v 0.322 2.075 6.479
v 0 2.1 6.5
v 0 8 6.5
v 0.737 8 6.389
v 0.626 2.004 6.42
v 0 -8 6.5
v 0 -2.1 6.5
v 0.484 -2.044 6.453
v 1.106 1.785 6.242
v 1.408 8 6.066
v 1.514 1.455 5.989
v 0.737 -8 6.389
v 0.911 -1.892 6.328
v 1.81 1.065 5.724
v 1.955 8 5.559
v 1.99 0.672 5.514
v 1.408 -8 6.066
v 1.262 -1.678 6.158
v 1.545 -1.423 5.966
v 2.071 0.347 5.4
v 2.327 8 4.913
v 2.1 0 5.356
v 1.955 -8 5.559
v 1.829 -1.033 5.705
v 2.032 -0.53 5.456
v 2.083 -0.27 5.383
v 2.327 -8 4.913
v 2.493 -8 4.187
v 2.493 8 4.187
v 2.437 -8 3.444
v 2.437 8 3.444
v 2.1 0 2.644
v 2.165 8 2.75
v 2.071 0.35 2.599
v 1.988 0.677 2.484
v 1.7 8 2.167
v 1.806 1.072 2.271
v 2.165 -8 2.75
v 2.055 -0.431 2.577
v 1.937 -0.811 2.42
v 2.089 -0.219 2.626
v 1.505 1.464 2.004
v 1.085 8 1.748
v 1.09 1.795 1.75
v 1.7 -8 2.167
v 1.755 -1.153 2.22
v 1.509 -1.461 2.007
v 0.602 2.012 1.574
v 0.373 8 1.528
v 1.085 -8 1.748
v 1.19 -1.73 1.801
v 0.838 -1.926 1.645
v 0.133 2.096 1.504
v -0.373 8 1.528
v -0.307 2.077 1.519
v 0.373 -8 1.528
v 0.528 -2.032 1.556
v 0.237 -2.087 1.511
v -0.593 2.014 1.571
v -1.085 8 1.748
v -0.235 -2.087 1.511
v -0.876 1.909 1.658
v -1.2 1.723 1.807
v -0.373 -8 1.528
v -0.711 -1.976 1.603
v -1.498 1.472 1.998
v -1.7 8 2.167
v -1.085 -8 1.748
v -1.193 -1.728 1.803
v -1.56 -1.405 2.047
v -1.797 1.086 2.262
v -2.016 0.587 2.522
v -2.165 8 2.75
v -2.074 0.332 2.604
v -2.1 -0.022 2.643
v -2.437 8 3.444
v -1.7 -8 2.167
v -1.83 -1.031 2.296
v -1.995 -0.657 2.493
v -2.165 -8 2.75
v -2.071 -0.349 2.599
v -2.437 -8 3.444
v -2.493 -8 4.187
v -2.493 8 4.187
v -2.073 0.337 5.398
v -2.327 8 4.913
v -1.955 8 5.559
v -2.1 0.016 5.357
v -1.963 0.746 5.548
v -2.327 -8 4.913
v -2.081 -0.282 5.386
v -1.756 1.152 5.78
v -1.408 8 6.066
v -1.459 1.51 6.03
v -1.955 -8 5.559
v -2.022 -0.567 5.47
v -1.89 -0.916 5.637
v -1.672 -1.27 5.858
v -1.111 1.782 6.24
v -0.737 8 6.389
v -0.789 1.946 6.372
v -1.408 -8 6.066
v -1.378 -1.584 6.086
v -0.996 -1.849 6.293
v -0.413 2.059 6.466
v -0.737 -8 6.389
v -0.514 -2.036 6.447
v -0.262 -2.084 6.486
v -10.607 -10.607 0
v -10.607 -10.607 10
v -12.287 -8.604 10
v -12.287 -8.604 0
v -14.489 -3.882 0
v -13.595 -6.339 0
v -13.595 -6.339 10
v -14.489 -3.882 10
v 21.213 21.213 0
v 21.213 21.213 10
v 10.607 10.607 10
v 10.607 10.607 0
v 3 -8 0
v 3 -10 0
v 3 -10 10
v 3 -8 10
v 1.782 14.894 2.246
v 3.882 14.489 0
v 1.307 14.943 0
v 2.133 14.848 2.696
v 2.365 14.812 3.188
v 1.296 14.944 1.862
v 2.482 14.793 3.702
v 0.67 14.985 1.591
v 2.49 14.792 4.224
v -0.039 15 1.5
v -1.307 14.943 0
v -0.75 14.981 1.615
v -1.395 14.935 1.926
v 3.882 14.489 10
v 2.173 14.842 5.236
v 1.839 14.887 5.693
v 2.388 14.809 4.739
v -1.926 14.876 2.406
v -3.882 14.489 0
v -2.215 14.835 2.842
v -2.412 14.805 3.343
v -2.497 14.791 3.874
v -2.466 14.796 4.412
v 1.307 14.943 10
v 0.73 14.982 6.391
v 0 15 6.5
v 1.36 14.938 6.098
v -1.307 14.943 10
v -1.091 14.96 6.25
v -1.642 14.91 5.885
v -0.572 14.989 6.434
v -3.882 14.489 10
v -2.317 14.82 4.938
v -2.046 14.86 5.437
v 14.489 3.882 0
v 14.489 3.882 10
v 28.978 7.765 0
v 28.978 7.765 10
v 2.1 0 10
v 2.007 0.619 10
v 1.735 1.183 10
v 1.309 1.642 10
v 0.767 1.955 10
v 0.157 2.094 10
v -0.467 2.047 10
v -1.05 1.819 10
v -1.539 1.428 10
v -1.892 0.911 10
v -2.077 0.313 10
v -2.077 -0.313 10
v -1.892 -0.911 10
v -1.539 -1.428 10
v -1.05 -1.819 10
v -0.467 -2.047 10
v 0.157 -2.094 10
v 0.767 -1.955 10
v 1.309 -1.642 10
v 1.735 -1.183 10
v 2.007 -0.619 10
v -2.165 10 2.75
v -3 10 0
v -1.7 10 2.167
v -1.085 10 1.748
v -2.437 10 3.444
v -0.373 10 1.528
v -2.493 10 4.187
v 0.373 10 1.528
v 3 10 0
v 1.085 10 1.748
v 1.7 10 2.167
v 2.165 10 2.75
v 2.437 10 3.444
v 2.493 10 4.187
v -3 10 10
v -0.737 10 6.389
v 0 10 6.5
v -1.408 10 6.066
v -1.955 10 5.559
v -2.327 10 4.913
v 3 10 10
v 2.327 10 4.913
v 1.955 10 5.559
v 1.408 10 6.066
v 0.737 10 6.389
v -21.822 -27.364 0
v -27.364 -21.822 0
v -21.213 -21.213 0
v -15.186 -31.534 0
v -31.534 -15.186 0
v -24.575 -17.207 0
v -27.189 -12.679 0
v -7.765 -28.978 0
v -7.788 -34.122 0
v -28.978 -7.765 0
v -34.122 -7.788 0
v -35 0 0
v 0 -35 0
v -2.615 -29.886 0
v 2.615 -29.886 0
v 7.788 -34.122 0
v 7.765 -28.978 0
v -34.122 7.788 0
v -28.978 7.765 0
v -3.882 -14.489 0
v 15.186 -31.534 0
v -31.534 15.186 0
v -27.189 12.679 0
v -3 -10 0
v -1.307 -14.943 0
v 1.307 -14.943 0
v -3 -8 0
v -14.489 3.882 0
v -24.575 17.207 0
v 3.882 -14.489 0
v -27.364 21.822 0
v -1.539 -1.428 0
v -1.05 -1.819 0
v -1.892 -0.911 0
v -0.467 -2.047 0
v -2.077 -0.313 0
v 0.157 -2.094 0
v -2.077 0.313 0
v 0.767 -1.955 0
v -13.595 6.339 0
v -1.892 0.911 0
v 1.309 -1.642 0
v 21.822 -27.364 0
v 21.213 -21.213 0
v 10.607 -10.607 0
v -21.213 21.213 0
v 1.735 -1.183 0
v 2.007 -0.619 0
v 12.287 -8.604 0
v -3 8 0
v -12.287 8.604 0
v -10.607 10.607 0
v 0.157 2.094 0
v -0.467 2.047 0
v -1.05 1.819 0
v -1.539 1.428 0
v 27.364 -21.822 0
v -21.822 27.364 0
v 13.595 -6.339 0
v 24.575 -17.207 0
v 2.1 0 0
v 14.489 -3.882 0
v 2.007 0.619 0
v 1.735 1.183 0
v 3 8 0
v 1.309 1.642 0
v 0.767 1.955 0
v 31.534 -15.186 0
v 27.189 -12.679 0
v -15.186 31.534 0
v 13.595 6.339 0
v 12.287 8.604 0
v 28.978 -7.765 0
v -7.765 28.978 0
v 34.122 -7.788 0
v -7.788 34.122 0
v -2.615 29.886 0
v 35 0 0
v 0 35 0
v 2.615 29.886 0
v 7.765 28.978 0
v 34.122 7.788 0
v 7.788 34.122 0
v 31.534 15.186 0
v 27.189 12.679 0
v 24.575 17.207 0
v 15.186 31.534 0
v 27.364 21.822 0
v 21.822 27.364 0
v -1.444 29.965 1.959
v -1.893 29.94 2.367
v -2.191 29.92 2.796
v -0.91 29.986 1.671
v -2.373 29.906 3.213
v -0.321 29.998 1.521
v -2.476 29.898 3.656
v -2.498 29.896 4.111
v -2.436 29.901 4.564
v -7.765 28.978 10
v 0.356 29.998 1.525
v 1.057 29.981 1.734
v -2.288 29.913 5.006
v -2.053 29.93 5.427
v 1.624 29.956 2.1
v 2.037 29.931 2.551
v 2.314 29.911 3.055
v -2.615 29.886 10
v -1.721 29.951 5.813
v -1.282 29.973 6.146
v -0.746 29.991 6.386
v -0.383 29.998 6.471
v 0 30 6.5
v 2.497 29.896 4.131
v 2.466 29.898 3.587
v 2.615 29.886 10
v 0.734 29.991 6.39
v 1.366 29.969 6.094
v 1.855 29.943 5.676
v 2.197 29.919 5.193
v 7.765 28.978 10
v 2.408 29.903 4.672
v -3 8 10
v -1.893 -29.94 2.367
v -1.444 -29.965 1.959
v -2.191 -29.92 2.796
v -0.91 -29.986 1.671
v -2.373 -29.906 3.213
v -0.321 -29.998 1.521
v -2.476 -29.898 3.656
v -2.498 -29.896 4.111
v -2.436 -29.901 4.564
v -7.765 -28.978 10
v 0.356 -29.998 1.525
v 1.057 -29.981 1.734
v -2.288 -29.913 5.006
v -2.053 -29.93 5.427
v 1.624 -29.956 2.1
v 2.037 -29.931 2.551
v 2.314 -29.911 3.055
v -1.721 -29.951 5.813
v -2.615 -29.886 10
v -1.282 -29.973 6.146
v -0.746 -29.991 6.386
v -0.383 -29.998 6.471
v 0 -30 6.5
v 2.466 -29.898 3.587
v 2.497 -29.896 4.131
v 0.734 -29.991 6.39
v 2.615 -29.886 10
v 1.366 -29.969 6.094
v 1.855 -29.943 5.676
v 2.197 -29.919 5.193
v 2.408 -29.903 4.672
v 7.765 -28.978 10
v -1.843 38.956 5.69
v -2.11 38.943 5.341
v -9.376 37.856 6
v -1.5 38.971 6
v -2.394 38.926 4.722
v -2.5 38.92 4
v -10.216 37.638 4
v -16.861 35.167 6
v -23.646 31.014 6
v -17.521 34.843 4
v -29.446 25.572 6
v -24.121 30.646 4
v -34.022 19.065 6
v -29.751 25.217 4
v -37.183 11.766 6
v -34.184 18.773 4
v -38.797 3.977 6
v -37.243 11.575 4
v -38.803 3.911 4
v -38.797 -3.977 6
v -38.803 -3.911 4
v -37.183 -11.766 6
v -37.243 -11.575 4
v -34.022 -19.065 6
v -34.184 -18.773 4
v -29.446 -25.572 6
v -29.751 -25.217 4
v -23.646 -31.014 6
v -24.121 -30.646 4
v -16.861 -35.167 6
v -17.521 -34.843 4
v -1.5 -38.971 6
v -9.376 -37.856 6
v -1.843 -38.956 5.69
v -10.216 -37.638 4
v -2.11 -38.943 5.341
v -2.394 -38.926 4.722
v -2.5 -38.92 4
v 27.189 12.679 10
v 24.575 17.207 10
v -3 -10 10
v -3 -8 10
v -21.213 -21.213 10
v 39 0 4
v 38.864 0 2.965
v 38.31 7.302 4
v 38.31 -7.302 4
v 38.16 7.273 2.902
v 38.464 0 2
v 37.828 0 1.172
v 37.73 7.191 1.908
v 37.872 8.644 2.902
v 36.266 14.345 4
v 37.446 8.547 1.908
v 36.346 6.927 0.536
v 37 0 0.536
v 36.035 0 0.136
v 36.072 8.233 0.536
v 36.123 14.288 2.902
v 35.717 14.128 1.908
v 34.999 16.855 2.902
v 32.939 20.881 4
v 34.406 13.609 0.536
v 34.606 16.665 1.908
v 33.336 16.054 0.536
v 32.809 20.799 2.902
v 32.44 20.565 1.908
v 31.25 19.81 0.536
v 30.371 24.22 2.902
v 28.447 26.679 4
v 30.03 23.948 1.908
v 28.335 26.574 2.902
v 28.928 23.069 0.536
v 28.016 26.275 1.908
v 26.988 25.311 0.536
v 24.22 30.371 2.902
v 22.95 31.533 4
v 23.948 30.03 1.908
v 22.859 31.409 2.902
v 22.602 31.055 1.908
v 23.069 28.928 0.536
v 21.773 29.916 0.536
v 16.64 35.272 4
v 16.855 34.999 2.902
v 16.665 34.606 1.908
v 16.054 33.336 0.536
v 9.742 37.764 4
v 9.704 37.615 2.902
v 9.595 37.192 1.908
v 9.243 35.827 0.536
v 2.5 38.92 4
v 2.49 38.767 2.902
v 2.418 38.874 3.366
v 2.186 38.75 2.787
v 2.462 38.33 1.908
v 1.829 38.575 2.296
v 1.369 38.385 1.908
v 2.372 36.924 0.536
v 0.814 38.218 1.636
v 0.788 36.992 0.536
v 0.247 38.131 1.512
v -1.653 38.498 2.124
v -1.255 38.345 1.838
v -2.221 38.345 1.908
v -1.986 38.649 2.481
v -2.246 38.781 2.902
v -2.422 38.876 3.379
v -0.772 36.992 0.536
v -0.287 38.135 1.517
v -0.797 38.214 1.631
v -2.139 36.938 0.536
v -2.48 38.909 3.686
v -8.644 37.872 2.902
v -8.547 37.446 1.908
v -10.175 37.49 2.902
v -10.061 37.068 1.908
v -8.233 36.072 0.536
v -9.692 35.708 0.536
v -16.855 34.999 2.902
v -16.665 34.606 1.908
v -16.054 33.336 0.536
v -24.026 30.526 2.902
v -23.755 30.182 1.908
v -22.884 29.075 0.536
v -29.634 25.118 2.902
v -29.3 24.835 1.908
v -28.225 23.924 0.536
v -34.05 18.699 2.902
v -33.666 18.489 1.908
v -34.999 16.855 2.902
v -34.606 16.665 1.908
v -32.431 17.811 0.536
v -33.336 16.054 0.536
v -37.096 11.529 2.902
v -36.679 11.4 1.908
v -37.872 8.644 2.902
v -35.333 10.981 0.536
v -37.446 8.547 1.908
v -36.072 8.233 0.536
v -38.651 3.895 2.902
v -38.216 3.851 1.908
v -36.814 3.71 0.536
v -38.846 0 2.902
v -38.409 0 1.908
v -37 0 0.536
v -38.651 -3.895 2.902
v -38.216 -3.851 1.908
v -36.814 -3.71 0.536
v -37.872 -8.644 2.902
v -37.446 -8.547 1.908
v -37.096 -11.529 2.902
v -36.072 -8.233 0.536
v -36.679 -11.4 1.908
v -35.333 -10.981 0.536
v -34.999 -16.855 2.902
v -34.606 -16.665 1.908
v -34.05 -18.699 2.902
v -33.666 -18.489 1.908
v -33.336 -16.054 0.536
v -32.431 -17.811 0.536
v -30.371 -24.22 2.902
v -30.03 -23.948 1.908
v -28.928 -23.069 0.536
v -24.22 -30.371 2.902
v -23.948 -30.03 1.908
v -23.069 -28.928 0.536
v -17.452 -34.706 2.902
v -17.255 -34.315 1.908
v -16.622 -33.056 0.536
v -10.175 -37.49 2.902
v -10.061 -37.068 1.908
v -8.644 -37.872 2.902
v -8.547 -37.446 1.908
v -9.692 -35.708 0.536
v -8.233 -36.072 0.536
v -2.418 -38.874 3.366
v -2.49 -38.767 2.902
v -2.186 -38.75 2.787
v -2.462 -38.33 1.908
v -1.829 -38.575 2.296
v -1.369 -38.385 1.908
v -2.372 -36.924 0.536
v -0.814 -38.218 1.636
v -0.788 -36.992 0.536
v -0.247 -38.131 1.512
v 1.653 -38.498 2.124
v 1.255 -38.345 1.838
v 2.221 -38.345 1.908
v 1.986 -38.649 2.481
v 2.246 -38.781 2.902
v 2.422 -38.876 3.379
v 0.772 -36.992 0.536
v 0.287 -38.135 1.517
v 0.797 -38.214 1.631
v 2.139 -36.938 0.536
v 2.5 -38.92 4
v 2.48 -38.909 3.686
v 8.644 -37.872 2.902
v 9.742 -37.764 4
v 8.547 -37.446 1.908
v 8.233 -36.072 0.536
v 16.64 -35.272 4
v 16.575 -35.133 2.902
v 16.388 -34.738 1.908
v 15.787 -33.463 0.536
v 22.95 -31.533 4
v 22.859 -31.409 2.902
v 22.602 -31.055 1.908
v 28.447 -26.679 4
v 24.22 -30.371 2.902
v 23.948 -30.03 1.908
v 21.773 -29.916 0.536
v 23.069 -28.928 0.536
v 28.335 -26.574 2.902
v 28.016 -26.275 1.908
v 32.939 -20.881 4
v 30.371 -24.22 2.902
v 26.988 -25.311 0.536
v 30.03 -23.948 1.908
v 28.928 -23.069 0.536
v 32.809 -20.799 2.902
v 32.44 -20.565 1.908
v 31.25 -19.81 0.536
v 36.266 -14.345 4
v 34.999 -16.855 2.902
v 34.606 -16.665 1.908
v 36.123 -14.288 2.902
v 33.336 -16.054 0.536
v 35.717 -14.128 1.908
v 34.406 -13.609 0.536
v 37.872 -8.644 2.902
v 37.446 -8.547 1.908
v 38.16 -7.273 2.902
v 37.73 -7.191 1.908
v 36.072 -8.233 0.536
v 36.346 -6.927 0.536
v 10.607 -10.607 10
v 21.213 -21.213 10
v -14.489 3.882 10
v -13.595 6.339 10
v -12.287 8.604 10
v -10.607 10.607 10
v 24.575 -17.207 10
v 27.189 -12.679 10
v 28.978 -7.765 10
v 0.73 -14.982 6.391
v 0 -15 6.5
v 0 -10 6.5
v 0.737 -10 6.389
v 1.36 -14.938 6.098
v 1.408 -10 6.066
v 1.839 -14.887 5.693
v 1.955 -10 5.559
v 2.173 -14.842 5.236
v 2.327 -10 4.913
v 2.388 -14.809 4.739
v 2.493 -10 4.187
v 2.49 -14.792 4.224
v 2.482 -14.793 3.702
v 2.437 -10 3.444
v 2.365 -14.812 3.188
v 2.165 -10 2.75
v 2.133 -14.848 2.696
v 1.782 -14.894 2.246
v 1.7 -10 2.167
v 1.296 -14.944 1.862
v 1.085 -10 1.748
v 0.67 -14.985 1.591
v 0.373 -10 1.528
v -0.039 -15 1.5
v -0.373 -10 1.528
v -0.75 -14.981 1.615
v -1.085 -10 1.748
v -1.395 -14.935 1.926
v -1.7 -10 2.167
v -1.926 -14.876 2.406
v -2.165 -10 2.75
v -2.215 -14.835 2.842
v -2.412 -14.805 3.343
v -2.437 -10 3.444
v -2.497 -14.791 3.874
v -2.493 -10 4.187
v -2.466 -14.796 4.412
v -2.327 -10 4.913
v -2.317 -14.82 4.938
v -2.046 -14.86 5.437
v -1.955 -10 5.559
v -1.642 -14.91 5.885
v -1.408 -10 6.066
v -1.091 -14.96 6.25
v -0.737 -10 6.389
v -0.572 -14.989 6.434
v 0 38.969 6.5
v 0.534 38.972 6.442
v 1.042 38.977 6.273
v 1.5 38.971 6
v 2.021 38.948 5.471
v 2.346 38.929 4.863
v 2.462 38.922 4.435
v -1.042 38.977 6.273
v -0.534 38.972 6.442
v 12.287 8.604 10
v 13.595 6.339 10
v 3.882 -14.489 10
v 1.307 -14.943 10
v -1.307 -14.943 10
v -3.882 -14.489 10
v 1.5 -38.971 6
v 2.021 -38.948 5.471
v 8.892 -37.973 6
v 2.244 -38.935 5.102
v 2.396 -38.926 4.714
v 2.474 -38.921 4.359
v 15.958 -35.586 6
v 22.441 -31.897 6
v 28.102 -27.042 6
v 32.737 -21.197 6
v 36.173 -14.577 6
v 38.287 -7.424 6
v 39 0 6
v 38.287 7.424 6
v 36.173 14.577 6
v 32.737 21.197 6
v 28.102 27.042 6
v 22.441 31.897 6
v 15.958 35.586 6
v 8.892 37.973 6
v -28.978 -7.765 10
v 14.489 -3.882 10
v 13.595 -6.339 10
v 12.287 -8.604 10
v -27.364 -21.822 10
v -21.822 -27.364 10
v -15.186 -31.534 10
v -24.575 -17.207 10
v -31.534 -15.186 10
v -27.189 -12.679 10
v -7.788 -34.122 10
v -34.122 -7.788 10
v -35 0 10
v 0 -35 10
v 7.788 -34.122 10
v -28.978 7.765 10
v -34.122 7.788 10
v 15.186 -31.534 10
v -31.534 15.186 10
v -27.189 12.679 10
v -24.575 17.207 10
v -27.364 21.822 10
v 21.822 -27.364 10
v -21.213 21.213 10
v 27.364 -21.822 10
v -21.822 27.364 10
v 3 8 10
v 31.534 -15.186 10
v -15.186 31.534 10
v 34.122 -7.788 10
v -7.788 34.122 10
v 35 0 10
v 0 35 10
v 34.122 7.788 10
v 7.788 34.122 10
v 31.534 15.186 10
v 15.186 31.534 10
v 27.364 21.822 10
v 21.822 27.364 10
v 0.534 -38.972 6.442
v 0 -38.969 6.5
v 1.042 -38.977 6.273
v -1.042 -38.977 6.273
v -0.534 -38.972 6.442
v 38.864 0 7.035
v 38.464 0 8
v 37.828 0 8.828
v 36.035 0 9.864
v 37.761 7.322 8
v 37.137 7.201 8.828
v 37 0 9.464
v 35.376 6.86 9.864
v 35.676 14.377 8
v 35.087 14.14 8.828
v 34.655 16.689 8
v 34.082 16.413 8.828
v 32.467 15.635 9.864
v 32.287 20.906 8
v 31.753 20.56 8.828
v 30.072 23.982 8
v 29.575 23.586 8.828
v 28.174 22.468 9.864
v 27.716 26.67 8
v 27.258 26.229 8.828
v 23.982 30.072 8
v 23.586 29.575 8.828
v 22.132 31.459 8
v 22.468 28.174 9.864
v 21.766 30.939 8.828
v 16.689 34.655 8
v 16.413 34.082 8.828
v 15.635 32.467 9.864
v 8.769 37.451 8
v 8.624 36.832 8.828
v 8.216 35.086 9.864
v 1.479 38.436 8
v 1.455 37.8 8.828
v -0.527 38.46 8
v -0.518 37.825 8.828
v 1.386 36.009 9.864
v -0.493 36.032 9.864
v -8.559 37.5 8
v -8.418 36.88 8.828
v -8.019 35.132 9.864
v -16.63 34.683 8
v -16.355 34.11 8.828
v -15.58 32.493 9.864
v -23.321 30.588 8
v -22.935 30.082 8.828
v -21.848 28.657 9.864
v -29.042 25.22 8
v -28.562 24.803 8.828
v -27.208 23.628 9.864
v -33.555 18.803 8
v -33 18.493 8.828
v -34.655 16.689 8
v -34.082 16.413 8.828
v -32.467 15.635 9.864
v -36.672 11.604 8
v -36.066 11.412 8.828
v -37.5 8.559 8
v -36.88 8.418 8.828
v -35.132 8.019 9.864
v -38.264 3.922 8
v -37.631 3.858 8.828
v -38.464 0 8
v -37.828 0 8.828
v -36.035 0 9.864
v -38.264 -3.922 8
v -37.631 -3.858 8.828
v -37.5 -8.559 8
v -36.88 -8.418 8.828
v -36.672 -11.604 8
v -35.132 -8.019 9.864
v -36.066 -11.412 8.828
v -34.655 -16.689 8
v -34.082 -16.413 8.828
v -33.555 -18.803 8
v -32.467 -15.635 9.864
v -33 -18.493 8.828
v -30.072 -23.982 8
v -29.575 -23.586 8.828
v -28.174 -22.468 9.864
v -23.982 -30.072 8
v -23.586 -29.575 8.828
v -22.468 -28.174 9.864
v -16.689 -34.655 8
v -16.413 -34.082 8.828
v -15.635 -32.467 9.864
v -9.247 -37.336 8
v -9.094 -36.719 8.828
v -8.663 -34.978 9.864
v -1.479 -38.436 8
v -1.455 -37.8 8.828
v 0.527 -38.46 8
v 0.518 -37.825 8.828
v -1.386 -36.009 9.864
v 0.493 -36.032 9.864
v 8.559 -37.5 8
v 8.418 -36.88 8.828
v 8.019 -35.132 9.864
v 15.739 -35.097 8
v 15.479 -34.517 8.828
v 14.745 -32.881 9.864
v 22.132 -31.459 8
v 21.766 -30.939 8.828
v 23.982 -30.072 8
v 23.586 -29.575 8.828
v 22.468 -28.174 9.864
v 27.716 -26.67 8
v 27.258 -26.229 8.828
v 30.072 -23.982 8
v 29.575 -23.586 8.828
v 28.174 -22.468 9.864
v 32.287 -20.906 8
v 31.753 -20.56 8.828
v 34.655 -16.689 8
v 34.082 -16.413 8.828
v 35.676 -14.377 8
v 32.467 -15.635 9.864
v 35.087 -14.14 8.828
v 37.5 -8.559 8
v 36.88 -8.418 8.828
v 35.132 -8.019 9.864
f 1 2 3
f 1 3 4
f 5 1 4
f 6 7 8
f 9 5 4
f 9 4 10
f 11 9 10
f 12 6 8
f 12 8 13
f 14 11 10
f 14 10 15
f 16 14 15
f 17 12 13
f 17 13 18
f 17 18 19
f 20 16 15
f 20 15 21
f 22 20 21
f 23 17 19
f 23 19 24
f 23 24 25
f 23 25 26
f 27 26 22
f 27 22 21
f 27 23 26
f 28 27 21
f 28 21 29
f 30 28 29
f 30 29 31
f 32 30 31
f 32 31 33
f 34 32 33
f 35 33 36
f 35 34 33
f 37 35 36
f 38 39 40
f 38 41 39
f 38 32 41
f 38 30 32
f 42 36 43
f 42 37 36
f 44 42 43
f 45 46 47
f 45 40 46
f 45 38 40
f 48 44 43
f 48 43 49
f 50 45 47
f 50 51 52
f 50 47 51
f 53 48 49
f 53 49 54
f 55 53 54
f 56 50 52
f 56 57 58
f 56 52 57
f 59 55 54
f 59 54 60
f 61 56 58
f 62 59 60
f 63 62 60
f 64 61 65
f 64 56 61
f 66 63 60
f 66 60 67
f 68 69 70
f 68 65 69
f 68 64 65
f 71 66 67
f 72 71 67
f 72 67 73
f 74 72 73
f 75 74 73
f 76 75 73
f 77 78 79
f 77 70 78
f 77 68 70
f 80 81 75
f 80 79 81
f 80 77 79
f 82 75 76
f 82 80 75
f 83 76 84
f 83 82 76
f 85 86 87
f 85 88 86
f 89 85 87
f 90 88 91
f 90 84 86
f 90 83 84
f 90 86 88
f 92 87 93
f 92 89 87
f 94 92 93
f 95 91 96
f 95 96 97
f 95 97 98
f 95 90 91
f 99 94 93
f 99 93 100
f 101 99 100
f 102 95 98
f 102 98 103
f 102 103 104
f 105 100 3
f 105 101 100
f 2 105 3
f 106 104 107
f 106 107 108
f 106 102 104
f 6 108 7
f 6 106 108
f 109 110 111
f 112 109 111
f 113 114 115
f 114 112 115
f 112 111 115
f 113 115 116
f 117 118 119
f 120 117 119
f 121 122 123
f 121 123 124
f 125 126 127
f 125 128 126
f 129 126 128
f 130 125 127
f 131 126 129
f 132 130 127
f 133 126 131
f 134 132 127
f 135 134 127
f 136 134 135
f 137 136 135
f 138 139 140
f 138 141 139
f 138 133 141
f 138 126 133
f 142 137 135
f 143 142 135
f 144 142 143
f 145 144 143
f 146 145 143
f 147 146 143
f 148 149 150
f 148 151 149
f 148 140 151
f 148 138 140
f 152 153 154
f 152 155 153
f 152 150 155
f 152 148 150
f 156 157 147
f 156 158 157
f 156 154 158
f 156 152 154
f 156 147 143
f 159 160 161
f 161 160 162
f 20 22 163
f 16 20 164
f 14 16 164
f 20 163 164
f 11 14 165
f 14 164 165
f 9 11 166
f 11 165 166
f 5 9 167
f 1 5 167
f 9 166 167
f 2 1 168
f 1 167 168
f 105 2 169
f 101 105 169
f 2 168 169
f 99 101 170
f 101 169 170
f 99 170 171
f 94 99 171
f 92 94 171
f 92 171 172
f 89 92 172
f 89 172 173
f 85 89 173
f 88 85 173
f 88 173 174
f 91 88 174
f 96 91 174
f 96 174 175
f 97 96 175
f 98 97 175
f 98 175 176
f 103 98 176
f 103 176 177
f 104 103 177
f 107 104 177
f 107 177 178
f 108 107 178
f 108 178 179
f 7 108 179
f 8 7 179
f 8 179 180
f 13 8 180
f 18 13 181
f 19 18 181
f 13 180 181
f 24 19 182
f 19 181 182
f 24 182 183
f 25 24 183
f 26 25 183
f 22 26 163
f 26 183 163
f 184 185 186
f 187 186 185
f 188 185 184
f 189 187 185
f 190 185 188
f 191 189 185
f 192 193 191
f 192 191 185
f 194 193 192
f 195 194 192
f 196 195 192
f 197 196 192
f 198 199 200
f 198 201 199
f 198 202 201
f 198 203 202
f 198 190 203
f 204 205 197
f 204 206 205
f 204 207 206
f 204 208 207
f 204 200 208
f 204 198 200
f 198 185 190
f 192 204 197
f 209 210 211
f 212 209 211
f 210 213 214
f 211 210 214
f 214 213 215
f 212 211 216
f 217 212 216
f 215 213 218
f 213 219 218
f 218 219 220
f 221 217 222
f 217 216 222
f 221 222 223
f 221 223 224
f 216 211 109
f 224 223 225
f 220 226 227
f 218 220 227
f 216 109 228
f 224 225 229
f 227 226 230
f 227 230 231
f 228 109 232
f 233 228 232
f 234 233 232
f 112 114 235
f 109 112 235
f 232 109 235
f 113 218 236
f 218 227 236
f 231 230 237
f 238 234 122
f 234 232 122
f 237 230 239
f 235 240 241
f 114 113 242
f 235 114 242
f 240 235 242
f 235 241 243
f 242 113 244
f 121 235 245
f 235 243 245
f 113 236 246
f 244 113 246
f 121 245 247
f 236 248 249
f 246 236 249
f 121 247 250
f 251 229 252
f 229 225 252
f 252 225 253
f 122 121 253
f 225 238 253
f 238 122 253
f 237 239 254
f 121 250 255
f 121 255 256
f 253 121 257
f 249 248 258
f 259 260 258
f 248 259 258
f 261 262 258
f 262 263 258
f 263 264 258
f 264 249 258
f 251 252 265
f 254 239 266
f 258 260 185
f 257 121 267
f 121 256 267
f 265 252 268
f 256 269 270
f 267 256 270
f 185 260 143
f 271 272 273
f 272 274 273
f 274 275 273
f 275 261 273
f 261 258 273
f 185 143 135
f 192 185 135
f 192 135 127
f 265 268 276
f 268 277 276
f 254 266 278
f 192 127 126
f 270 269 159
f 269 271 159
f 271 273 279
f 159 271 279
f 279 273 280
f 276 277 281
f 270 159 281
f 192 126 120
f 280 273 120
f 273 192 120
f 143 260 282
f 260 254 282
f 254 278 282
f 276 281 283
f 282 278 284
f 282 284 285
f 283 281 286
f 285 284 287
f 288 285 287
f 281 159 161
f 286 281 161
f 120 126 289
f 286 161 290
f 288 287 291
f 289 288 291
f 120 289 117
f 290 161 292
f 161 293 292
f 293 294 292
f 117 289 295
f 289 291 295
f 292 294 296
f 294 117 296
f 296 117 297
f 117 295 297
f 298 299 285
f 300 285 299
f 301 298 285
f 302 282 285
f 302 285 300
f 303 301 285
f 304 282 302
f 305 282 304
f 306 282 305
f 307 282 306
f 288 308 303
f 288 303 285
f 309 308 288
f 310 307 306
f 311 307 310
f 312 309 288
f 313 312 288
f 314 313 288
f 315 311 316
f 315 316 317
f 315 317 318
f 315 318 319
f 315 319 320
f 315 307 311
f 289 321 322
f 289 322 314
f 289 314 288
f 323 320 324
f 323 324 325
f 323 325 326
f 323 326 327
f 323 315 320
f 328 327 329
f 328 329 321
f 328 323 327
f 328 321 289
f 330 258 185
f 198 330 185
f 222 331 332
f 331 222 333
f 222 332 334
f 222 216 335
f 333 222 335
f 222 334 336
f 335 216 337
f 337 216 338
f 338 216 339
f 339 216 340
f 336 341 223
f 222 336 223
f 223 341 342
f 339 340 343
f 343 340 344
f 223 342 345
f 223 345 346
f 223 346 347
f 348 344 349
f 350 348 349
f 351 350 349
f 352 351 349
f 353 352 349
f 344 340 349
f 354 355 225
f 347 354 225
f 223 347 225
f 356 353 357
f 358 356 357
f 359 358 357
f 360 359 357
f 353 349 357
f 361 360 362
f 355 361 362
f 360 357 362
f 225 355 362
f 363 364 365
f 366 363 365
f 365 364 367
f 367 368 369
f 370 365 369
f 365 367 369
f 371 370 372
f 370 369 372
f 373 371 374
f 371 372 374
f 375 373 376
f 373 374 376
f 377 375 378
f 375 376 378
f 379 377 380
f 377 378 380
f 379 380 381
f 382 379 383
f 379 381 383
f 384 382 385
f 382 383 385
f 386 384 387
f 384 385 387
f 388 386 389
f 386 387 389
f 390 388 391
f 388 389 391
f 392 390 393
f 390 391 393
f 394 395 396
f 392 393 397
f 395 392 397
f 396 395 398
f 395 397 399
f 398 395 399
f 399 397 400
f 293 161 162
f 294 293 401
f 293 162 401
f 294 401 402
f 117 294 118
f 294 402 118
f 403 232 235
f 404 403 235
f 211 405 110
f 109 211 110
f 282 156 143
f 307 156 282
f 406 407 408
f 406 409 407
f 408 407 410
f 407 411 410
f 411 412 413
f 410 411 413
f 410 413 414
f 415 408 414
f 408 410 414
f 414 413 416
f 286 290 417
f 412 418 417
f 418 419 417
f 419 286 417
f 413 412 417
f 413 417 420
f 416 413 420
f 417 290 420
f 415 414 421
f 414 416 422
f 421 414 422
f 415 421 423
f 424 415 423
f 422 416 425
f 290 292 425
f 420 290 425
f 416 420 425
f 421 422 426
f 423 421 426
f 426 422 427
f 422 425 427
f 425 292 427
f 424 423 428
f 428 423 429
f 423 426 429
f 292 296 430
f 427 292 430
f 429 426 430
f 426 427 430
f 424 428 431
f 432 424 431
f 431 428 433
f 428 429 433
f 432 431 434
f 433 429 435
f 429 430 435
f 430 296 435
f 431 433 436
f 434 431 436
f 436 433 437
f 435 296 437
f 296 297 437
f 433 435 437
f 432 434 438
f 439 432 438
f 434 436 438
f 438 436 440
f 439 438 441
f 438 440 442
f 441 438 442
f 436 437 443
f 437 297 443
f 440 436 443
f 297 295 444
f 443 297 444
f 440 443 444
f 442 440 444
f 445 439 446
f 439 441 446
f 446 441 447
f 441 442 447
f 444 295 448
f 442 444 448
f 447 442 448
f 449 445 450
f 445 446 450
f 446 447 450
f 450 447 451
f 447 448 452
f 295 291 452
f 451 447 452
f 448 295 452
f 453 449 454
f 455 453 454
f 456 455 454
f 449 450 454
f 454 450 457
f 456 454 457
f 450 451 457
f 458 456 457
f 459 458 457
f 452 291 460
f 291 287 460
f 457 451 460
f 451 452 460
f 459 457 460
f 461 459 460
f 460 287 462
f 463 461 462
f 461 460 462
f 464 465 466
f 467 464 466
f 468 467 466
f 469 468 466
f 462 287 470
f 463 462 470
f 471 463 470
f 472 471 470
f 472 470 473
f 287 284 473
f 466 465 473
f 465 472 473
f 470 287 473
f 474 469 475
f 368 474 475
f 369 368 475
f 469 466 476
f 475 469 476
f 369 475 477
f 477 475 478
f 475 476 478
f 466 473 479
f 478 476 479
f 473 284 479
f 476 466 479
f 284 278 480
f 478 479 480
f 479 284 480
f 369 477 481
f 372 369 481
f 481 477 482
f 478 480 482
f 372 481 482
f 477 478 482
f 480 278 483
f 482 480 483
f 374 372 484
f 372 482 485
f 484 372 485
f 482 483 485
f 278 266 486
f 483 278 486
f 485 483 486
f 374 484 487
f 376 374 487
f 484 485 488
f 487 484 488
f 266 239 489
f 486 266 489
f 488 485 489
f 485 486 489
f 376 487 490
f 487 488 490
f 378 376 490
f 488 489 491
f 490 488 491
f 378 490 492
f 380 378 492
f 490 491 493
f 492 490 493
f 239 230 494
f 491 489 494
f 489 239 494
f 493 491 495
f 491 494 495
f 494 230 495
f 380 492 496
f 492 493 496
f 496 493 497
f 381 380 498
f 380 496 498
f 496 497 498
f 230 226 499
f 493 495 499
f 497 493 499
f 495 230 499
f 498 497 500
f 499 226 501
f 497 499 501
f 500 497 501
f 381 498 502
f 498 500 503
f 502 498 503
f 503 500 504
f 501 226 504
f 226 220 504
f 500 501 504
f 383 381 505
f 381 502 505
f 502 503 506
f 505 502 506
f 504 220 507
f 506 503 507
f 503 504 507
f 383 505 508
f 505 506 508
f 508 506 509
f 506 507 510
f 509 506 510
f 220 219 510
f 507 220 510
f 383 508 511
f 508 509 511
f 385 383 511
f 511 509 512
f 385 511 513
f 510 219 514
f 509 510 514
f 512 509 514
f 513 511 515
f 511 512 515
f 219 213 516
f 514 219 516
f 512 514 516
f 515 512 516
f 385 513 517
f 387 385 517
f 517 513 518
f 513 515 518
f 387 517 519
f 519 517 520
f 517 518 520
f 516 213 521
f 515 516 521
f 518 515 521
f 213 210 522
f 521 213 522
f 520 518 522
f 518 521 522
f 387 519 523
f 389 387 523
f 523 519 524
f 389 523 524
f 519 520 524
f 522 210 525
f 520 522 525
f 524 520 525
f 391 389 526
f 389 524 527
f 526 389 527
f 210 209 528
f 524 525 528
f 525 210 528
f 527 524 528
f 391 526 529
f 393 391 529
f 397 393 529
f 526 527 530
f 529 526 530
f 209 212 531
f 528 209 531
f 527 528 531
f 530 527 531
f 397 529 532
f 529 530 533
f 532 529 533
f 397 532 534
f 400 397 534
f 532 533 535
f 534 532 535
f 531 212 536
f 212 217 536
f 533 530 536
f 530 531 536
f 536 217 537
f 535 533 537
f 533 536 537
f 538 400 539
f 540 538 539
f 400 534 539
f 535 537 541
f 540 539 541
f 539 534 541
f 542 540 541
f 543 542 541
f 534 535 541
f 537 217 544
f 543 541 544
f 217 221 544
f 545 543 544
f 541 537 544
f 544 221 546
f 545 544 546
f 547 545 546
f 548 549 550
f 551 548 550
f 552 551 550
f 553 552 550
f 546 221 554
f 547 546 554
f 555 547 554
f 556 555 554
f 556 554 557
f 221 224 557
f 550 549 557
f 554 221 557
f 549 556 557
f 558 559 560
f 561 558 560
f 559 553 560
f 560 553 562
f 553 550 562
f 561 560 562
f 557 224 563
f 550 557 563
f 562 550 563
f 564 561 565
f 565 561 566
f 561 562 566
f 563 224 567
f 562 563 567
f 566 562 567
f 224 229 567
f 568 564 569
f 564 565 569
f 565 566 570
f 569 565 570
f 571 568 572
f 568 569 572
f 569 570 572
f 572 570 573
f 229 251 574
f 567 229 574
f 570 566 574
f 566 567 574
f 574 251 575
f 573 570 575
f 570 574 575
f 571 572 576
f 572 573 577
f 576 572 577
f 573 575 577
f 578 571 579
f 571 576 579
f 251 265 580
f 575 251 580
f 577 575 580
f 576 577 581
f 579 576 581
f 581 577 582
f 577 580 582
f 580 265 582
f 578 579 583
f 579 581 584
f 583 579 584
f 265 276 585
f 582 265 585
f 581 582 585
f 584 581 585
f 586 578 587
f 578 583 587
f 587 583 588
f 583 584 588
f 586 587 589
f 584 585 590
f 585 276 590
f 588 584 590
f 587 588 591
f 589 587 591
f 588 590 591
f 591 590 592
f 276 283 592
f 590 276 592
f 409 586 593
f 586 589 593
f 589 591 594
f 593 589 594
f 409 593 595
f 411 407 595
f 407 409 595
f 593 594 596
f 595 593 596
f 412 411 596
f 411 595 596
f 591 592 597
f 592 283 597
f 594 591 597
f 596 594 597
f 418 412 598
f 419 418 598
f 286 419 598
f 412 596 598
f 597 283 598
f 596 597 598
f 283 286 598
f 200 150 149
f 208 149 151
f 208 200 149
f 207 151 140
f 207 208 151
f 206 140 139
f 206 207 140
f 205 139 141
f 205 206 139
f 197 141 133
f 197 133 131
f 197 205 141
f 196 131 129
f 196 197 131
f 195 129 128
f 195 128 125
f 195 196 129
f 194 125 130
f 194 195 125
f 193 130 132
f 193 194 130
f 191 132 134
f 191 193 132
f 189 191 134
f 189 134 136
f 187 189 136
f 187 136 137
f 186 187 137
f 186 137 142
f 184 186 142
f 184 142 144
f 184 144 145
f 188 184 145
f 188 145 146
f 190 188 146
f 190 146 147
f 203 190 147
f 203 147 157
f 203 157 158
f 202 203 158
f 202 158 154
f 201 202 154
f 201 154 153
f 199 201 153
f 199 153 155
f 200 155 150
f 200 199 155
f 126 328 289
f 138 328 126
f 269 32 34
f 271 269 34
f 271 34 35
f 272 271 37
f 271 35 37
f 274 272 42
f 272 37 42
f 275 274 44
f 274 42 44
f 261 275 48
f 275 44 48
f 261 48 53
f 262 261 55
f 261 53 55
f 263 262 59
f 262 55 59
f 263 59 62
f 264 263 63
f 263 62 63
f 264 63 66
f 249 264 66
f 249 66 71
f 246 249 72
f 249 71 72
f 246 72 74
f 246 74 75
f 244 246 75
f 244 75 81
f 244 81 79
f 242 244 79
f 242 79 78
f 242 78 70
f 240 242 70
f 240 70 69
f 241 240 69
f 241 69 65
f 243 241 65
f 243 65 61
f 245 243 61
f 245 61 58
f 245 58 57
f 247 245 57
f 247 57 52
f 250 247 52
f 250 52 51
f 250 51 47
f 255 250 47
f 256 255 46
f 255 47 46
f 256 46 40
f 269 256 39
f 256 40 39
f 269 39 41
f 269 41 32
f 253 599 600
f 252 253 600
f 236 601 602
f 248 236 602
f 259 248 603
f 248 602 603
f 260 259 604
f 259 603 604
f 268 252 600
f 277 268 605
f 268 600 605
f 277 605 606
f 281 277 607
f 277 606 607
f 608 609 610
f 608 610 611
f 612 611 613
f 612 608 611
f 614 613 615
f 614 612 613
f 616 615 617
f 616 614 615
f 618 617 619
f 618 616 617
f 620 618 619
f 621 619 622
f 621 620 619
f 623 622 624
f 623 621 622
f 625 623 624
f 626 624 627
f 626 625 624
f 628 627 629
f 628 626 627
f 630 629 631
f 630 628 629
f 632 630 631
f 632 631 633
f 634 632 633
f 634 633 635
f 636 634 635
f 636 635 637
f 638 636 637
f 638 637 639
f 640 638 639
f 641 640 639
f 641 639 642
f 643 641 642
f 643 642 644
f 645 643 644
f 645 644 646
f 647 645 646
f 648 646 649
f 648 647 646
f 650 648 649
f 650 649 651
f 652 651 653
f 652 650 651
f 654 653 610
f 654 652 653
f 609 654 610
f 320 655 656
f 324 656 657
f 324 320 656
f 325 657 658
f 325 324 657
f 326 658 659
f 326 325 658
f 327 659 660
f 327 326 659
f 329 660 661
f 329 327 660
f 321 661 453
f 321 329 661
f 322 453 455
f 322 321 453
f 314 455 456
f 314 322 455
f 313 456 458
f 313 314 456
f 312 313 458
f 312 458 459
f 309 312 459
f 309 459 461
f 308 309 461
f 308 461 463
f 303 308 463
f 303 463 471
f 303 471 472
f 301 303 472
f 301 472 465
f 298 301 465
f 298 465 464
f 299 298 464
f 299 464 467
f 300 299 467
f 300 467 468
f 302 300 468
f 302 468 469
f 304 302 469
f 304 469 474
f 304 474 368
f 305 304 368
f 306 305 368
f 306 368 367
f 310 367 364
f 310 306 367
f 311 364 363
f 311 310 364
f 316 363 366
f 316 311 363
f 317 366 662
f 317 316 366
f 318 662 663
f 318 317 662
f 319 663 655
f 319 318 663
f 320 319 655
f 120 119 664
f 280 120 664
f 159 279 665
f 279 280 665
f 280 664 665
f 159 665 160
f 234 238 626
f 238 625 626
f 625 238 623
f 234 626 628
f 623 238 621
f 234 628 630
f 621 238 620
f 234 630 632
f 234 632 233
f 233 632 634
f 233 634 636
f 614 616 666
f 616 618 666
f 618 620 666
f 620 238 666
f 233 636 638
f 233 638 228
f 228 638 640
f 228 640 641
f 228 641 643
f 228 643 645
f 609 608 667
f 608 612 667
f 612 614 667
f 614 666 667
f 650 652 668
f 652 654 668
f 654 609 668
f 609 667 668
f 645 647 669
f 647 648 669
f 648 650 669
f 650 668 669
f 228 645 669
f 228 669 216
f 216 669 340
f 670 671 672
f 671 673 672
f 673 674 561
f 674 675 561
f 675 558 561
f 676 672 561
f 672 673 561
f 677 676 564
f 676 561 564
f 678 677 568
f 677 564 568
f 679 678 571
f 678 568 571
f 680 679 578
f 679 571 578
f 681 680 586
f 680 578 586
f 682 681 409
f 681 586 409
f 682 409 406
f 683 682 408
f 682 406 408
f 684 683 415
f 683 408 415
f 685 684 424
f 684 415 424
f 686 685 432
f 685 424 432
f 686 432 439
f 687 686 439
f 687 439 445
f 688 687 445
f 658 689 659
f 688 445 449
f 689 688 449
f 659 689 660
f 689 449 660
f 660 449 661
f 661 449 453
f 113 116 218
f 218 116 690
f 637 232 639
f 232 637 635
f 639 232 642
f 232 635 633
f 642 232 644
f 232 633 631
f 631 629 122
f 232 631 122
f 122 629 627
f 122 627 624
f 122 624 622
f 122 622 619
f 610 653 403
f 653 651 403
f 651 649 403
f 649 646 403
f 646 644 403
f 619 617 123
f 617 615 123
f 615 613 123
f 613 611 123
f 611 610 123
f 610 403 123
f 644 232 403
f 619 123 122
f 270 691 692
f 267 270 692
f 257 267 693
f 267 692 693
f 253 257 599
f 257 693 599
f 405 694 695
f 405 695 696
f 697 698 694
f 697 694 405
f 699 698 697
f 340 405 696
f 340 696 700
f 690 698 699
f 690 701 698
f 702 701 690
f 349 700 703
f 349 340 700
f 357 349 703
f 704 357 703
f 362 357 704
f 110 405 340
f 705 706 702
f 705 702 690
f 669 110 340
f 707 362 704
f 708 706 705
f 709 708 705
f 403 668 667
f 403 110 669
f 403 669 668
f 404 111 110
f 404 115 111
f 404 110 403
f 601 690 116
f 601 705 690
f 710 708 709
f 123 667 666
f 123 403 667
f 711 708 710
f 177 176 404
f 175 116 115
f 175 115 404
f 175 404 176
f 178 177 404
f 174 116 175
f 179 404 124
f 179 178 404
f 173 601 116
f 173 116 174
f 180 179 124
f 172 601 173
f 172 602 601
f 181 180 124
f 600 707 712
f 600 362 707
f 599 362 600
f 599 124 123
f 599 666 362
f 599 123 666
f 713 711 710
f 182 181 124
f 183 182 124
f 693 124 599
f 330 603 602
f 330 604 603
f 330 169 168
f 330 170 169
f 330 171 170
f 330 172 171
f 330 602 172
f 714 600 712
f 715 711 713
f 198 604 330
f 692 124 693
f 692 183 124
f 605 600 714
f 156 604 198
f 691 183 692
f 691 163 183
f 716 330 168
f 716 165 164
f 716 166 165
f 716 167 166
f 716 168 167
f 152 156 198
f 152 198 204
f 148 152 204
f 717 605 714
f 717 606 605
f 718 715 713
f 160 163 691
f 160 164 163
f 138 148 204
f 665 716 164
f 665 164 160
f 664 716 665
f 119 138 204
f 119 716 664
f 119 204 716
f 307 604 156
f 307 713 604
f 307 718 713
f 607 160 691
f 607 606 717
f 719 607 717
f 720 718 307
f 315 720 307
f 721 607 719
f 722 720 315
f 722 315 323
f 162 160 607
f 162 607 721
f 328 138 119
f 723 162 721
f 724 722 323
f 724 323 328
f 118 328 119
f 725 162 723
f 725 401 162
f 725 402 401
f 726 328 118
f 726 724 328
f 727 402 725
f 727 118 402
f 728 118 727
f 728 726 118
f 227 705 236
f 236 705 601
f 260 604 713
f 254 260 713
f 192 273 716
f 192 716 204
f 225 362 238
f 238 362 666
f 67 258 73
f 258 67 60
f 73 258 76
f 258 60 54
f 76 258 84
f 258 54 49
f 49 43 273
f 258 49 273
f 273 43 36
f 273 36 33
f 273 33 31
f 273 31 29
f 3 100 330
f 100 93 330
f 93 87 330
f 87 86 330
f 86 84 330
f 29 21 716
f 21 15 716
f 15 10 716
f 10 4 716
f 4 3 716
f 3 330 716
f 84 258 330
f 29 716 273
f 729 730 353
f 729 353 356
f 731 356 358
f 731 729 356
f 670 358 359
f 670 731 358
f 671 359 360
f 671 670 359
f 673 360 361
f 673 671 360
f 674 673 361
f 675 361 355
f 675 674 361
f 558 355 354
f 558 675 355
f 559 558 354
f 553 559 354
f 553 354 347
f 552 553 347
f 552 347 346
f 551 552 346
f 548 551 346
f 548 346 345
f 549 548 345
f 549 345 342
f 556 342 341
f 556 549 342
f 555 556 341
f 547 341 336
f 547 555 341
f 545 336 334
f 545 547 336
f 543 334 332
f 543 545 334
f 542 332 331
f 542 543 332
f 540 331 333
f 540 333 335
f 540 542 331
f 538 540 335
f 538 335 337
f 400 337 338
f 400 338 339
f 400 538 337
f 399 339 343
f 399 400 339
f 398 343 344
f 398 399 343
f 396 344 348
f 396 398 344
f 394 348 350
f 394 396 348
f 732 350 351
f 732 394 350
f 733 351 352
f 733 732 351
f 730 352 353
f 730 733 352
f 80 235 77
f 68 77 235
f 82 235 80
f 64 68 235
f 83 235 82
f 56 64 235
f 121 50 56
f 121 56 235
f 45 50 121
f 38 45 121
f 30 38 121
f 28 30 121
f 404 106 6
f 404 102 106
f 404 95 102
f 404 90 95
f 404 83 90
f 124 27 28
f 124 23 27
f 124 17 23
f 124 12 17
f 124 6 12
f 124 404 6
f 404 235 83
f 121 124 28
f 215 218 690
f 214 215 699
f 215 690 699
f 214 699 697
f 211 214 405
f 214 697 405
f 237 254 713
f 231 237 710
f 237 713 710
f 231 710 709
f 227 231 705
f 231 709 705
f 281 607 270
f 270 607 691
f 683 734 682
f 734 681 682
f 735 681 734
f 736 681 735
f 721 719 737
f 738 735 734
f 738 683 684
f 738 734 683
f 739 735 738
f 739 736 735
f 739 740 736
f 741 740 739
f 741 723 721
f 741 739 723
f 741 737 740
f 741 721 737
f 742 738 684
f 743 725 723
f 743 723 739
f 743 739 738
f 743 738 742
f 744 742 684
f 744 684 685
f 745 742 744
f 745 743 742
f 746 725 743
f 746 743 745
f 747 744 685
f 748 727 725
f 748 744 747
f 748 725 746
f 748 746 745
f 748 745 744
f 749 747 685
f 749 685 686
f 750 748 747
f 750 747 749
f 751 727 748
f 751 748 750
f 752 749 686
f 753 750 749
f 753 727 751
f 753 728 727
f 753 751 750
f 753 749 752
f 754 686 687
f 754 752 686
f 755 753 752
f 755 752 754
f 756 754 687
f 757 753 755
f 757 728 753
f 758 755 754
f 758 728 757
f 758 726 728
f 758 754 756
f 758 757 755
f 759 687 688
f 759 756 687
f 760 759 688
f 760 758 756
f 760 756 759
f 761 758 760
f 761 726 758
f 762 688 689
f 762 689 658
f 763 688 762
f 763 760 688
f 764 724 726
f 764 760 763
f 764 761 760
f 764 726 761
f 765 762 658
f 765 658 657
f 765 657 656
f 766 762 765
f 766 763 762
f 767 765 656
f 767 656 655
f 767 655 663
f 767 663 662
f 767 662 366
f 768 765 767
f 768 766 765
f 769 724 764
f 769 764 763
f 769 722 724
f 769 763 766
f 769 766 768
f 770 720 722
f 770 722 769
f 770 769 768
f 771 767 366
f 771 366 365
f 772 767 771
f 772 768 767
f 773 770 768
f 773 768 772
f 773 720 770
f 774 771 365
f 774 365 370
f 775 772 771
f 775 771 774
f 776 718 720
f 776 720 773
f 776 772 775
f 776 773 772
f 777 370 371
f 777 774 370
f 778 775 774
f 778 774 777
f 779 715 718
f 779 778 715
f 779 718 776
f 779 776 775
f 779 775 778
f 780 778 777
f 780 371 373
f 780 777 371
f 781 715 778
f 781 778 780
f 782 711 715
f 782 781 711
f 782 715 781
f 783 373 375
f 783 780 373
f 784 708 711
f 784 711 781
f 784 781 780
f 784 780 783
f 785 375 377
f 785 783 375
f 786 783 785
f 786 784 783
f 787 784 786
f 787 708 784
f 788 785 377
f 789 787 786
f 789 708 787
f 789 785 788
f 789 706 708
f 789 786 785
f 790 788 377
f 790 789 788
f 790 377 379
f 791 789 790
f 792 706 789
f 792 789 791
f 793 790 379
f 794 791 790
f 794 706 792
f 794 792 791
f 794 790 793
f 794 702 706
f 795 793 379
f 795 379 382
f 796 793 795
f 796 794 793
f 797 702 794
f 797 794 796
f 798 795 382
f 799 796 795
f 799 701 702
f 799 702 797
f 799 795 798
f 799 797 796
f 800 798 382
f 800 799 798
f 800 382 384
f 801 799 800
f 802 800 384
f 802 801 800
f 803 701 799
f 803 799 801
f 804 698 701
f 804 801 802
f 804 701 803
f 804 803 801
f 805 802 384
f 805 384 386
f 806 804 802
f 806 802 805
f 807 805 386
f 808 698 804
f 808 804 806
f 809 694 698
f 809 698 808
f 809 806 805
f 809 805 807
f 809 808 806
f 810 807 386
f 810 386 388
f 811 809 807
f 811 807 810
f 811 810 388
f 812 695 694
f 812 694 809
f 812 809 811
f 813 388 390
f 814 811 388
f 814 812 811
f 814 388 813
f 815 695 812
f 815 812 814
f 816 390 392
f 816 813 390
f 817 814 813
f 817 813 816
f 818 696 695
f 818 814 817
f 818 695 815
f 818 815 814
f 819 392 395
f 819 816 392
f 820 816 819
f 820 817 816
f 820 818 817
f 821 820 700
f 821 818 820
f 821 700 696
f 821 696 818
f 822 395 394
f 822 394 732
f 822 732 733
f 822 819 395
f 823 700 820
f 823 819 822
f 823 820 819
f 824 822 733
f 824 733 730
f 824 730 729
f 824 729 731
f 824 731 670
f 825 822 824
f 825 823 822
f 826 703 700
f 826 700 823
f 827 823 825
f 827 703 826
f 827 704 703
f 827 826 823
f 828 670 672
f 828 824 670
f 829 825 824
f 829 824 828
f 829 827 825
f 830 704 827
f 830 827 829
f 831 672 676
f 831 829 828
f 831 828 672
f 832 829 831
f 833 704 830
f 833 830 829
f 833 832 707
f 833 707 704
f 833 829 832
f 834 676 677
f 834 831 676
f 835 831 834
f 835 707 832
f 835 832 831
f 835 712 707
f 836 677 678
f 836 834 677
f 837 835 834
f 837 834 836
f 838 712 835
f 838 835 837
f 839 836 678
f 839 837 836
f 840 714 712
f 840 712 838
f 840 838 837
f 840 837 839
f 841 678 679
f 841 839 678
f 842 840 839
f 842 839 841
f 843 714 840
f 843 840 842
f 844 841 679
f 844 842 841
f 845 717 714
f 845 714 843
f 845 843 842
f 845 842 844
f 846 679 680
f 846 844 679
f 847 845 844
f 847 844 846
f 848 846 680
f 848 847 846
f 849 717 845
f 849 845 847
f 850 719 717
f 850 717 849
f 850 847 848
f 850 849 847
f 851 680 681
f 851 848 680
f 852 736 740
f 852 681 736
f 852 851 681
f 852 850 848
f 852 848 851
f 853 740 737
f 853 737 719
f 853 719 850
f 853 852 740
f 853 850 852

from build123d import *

# Parameters (mm, degrees)
SKETCH1_R               = 39
BOSS_EXTRUDE1_DEPTH     = 10
SKETCH2_R               = 2.1
CUT_EXTRUDE1_DEPTH      = 57.053545829
FILLET1_R               = 4
CUT_EXTRUDE2_DEPTH      = 57.053545829
SKETCH4_W               = 6
SKETCH4_H               = 2
CUT_EXTRUDE3_DEPTH      = 57.053545829
CUT_EXTRUDE4_DEPTH      = 62.886993787
CUT_EXTRUDE4_DEPTH_BACK = 62.886993787
SKETCH5_R               = 2.5


with BuildPart() as part:
    # Sketch1 → Boss-Extrude1 (new body)
    with BuildSketch(Plane.XY):
        Circle(SKETCH1_R)
    extrude(amount=BOSS_EXTRUDE1_DEPTH)

    # Sketch2 → Cut-Extrude1 (cut, through all)
    with BuildSketch(Plane.XY.offset(10)):
        Circle(SKETCH2_R)
    extrude(amount=-CUT_EXTRUDE1_DEPTH, mode=Mode.SUBTRACT)

    # Fillet1
    fillet1_edges = [part.edges().sort_by_distance(p)[0] for p in [
        (-39, 0, 0),
        (-39, 0, 10),
    ]]
    fillet(fillet1_edges, radius=FILLET1_R)

    # Sketch3 → Cut-Extrude2 (cut, through all)
    with BuildSketch(Plane.XY.offset(10)):
        with BuildLine():
            Line((7.764571353, 28.977774789), (3.882285677, 14.488887394))
            ThreePointArc((3.882285677, 14.488887394), (0, 15), (-3.882285677, 14.488887394))
            Line((-3.882285677, 14.488887394), (-7.764571353, 28.977774789))
            ThreePointArc((-7.764571353, 28.977774789), (0, 30), (7.764571353, 28.977774789))
        make_face()
        with BuildLine():
            Line((21.213203436, 21.213203436), (10.606601718, 10.606601718))
            ThreePointArc((10.606601718, 10.606601718), (12.990381057, 7.5), (14.488887394, 3.882285677))
            Line((14.488887394, 3.882285677), (28.977774789, 7.764571353))
            ThreePointArc((28.977774789, 7.764571353), (25.980762114, 15), (21.213203436, 21.213203436))
        make_face()
        with BuildLine():
            Line((28.977774789, -7.764571353), (14.488887394, -3.882285677))
            ThreePointArc((14.488887394, -3.882285677), (12.990381057, -7.5), (10.606601718, -10.606601718))
            Line((10.606601718, -10.606601718), (21.213203436, -21.213203436))
            ThreePointArc((21.213203436, -21.213203436), (25.980762114, -15), (28.977774789, -7.764571353))
        make_face()
        with BuildLine():
            Line((7.764571353, -28.977774789), (3.882285677, -14.488887394))
            ThreePointArc((3.882285677, -14.488887394), (0, -15), (-3.882285677, -14.488887394))
            Line((-3.882285677, -14.488887394), (-7.764571353, -28.977774789))
            ThreePointArc((-7.764571353, -28.977774789), (0, -30), (7.764571353, -28.977774789))
        make_face()
        with BuildLine():
            Line((-21.213203436, -21.213203436), (-10.606601718, -10.606601718))
            ThreePointArc((-10.606601718, -10.606601718), (-12.990381057, -7.5), (-14.488887394, -3.882285677))
            Line((-14.488887394, -3.882285677), (-28.977774789, -7.764571353))
            ThreePointArc((-28.977774789, -7.764571353), (-25.980762114, -15), (-21.213203436, -21.213203436))
        make_face()
        with BuildLine():
            Line((-28.977774789, 7.764571353), (-14.488887394, 3.882285677))
            ThreePointArc((-14.488887394, 3.882285677), (-12.990381057, 7.5), (-10.606601718, 10.606601718))
            Line((-10.606601718, 10.606601718), (-21.213203436, 21.213203436))
            ThreePointArc((-21.213203436, 21.213203436), (-25.980762114, 15), (-28.977774789, 7.764571353))
        make_face()
    extrude(amount=-CUT_EXTRUDE2_DEPTH, mode=Mode.SUBTRACT)

    # Sketch4 → Cut-Extrude3 (cut, through all)
    with BuildSketch(Plane.XY.offset(10)):
        with Locations((0, 9)):
            Rectangle(SKETCH4_W, SKETCH4_H)
        with Locations((0, -9)):
            Rectangle(SKETCH4_W, SKETCH4_H)
    extrude(amount=-CUT_EXTRUDE3_DEPTH, mode=Mode.SUBTRACT)

    # Sketch5 → Cut-Extrude4 (cut, two sides: drawn at the far end of the back side and taken through both)
    with BuildSketch(Plane(origin=(0, 8, 0), x_dir=(1, 0, 0), z_dir=(0, 1, 0)).offset(-CUT_EXTRUDE4_DEPTH_BACK)):
        with Locations(Location((0, -4, 0), (0, 0, 270))):
            Circle(SKETCH5_R)
    extrude(amount=CUT_EXTRUDE4_DEPTH + CUT_EXTRUDE4_DEPTH_BACK, mode=Mode.SUBTRACT)


solid = part.part
